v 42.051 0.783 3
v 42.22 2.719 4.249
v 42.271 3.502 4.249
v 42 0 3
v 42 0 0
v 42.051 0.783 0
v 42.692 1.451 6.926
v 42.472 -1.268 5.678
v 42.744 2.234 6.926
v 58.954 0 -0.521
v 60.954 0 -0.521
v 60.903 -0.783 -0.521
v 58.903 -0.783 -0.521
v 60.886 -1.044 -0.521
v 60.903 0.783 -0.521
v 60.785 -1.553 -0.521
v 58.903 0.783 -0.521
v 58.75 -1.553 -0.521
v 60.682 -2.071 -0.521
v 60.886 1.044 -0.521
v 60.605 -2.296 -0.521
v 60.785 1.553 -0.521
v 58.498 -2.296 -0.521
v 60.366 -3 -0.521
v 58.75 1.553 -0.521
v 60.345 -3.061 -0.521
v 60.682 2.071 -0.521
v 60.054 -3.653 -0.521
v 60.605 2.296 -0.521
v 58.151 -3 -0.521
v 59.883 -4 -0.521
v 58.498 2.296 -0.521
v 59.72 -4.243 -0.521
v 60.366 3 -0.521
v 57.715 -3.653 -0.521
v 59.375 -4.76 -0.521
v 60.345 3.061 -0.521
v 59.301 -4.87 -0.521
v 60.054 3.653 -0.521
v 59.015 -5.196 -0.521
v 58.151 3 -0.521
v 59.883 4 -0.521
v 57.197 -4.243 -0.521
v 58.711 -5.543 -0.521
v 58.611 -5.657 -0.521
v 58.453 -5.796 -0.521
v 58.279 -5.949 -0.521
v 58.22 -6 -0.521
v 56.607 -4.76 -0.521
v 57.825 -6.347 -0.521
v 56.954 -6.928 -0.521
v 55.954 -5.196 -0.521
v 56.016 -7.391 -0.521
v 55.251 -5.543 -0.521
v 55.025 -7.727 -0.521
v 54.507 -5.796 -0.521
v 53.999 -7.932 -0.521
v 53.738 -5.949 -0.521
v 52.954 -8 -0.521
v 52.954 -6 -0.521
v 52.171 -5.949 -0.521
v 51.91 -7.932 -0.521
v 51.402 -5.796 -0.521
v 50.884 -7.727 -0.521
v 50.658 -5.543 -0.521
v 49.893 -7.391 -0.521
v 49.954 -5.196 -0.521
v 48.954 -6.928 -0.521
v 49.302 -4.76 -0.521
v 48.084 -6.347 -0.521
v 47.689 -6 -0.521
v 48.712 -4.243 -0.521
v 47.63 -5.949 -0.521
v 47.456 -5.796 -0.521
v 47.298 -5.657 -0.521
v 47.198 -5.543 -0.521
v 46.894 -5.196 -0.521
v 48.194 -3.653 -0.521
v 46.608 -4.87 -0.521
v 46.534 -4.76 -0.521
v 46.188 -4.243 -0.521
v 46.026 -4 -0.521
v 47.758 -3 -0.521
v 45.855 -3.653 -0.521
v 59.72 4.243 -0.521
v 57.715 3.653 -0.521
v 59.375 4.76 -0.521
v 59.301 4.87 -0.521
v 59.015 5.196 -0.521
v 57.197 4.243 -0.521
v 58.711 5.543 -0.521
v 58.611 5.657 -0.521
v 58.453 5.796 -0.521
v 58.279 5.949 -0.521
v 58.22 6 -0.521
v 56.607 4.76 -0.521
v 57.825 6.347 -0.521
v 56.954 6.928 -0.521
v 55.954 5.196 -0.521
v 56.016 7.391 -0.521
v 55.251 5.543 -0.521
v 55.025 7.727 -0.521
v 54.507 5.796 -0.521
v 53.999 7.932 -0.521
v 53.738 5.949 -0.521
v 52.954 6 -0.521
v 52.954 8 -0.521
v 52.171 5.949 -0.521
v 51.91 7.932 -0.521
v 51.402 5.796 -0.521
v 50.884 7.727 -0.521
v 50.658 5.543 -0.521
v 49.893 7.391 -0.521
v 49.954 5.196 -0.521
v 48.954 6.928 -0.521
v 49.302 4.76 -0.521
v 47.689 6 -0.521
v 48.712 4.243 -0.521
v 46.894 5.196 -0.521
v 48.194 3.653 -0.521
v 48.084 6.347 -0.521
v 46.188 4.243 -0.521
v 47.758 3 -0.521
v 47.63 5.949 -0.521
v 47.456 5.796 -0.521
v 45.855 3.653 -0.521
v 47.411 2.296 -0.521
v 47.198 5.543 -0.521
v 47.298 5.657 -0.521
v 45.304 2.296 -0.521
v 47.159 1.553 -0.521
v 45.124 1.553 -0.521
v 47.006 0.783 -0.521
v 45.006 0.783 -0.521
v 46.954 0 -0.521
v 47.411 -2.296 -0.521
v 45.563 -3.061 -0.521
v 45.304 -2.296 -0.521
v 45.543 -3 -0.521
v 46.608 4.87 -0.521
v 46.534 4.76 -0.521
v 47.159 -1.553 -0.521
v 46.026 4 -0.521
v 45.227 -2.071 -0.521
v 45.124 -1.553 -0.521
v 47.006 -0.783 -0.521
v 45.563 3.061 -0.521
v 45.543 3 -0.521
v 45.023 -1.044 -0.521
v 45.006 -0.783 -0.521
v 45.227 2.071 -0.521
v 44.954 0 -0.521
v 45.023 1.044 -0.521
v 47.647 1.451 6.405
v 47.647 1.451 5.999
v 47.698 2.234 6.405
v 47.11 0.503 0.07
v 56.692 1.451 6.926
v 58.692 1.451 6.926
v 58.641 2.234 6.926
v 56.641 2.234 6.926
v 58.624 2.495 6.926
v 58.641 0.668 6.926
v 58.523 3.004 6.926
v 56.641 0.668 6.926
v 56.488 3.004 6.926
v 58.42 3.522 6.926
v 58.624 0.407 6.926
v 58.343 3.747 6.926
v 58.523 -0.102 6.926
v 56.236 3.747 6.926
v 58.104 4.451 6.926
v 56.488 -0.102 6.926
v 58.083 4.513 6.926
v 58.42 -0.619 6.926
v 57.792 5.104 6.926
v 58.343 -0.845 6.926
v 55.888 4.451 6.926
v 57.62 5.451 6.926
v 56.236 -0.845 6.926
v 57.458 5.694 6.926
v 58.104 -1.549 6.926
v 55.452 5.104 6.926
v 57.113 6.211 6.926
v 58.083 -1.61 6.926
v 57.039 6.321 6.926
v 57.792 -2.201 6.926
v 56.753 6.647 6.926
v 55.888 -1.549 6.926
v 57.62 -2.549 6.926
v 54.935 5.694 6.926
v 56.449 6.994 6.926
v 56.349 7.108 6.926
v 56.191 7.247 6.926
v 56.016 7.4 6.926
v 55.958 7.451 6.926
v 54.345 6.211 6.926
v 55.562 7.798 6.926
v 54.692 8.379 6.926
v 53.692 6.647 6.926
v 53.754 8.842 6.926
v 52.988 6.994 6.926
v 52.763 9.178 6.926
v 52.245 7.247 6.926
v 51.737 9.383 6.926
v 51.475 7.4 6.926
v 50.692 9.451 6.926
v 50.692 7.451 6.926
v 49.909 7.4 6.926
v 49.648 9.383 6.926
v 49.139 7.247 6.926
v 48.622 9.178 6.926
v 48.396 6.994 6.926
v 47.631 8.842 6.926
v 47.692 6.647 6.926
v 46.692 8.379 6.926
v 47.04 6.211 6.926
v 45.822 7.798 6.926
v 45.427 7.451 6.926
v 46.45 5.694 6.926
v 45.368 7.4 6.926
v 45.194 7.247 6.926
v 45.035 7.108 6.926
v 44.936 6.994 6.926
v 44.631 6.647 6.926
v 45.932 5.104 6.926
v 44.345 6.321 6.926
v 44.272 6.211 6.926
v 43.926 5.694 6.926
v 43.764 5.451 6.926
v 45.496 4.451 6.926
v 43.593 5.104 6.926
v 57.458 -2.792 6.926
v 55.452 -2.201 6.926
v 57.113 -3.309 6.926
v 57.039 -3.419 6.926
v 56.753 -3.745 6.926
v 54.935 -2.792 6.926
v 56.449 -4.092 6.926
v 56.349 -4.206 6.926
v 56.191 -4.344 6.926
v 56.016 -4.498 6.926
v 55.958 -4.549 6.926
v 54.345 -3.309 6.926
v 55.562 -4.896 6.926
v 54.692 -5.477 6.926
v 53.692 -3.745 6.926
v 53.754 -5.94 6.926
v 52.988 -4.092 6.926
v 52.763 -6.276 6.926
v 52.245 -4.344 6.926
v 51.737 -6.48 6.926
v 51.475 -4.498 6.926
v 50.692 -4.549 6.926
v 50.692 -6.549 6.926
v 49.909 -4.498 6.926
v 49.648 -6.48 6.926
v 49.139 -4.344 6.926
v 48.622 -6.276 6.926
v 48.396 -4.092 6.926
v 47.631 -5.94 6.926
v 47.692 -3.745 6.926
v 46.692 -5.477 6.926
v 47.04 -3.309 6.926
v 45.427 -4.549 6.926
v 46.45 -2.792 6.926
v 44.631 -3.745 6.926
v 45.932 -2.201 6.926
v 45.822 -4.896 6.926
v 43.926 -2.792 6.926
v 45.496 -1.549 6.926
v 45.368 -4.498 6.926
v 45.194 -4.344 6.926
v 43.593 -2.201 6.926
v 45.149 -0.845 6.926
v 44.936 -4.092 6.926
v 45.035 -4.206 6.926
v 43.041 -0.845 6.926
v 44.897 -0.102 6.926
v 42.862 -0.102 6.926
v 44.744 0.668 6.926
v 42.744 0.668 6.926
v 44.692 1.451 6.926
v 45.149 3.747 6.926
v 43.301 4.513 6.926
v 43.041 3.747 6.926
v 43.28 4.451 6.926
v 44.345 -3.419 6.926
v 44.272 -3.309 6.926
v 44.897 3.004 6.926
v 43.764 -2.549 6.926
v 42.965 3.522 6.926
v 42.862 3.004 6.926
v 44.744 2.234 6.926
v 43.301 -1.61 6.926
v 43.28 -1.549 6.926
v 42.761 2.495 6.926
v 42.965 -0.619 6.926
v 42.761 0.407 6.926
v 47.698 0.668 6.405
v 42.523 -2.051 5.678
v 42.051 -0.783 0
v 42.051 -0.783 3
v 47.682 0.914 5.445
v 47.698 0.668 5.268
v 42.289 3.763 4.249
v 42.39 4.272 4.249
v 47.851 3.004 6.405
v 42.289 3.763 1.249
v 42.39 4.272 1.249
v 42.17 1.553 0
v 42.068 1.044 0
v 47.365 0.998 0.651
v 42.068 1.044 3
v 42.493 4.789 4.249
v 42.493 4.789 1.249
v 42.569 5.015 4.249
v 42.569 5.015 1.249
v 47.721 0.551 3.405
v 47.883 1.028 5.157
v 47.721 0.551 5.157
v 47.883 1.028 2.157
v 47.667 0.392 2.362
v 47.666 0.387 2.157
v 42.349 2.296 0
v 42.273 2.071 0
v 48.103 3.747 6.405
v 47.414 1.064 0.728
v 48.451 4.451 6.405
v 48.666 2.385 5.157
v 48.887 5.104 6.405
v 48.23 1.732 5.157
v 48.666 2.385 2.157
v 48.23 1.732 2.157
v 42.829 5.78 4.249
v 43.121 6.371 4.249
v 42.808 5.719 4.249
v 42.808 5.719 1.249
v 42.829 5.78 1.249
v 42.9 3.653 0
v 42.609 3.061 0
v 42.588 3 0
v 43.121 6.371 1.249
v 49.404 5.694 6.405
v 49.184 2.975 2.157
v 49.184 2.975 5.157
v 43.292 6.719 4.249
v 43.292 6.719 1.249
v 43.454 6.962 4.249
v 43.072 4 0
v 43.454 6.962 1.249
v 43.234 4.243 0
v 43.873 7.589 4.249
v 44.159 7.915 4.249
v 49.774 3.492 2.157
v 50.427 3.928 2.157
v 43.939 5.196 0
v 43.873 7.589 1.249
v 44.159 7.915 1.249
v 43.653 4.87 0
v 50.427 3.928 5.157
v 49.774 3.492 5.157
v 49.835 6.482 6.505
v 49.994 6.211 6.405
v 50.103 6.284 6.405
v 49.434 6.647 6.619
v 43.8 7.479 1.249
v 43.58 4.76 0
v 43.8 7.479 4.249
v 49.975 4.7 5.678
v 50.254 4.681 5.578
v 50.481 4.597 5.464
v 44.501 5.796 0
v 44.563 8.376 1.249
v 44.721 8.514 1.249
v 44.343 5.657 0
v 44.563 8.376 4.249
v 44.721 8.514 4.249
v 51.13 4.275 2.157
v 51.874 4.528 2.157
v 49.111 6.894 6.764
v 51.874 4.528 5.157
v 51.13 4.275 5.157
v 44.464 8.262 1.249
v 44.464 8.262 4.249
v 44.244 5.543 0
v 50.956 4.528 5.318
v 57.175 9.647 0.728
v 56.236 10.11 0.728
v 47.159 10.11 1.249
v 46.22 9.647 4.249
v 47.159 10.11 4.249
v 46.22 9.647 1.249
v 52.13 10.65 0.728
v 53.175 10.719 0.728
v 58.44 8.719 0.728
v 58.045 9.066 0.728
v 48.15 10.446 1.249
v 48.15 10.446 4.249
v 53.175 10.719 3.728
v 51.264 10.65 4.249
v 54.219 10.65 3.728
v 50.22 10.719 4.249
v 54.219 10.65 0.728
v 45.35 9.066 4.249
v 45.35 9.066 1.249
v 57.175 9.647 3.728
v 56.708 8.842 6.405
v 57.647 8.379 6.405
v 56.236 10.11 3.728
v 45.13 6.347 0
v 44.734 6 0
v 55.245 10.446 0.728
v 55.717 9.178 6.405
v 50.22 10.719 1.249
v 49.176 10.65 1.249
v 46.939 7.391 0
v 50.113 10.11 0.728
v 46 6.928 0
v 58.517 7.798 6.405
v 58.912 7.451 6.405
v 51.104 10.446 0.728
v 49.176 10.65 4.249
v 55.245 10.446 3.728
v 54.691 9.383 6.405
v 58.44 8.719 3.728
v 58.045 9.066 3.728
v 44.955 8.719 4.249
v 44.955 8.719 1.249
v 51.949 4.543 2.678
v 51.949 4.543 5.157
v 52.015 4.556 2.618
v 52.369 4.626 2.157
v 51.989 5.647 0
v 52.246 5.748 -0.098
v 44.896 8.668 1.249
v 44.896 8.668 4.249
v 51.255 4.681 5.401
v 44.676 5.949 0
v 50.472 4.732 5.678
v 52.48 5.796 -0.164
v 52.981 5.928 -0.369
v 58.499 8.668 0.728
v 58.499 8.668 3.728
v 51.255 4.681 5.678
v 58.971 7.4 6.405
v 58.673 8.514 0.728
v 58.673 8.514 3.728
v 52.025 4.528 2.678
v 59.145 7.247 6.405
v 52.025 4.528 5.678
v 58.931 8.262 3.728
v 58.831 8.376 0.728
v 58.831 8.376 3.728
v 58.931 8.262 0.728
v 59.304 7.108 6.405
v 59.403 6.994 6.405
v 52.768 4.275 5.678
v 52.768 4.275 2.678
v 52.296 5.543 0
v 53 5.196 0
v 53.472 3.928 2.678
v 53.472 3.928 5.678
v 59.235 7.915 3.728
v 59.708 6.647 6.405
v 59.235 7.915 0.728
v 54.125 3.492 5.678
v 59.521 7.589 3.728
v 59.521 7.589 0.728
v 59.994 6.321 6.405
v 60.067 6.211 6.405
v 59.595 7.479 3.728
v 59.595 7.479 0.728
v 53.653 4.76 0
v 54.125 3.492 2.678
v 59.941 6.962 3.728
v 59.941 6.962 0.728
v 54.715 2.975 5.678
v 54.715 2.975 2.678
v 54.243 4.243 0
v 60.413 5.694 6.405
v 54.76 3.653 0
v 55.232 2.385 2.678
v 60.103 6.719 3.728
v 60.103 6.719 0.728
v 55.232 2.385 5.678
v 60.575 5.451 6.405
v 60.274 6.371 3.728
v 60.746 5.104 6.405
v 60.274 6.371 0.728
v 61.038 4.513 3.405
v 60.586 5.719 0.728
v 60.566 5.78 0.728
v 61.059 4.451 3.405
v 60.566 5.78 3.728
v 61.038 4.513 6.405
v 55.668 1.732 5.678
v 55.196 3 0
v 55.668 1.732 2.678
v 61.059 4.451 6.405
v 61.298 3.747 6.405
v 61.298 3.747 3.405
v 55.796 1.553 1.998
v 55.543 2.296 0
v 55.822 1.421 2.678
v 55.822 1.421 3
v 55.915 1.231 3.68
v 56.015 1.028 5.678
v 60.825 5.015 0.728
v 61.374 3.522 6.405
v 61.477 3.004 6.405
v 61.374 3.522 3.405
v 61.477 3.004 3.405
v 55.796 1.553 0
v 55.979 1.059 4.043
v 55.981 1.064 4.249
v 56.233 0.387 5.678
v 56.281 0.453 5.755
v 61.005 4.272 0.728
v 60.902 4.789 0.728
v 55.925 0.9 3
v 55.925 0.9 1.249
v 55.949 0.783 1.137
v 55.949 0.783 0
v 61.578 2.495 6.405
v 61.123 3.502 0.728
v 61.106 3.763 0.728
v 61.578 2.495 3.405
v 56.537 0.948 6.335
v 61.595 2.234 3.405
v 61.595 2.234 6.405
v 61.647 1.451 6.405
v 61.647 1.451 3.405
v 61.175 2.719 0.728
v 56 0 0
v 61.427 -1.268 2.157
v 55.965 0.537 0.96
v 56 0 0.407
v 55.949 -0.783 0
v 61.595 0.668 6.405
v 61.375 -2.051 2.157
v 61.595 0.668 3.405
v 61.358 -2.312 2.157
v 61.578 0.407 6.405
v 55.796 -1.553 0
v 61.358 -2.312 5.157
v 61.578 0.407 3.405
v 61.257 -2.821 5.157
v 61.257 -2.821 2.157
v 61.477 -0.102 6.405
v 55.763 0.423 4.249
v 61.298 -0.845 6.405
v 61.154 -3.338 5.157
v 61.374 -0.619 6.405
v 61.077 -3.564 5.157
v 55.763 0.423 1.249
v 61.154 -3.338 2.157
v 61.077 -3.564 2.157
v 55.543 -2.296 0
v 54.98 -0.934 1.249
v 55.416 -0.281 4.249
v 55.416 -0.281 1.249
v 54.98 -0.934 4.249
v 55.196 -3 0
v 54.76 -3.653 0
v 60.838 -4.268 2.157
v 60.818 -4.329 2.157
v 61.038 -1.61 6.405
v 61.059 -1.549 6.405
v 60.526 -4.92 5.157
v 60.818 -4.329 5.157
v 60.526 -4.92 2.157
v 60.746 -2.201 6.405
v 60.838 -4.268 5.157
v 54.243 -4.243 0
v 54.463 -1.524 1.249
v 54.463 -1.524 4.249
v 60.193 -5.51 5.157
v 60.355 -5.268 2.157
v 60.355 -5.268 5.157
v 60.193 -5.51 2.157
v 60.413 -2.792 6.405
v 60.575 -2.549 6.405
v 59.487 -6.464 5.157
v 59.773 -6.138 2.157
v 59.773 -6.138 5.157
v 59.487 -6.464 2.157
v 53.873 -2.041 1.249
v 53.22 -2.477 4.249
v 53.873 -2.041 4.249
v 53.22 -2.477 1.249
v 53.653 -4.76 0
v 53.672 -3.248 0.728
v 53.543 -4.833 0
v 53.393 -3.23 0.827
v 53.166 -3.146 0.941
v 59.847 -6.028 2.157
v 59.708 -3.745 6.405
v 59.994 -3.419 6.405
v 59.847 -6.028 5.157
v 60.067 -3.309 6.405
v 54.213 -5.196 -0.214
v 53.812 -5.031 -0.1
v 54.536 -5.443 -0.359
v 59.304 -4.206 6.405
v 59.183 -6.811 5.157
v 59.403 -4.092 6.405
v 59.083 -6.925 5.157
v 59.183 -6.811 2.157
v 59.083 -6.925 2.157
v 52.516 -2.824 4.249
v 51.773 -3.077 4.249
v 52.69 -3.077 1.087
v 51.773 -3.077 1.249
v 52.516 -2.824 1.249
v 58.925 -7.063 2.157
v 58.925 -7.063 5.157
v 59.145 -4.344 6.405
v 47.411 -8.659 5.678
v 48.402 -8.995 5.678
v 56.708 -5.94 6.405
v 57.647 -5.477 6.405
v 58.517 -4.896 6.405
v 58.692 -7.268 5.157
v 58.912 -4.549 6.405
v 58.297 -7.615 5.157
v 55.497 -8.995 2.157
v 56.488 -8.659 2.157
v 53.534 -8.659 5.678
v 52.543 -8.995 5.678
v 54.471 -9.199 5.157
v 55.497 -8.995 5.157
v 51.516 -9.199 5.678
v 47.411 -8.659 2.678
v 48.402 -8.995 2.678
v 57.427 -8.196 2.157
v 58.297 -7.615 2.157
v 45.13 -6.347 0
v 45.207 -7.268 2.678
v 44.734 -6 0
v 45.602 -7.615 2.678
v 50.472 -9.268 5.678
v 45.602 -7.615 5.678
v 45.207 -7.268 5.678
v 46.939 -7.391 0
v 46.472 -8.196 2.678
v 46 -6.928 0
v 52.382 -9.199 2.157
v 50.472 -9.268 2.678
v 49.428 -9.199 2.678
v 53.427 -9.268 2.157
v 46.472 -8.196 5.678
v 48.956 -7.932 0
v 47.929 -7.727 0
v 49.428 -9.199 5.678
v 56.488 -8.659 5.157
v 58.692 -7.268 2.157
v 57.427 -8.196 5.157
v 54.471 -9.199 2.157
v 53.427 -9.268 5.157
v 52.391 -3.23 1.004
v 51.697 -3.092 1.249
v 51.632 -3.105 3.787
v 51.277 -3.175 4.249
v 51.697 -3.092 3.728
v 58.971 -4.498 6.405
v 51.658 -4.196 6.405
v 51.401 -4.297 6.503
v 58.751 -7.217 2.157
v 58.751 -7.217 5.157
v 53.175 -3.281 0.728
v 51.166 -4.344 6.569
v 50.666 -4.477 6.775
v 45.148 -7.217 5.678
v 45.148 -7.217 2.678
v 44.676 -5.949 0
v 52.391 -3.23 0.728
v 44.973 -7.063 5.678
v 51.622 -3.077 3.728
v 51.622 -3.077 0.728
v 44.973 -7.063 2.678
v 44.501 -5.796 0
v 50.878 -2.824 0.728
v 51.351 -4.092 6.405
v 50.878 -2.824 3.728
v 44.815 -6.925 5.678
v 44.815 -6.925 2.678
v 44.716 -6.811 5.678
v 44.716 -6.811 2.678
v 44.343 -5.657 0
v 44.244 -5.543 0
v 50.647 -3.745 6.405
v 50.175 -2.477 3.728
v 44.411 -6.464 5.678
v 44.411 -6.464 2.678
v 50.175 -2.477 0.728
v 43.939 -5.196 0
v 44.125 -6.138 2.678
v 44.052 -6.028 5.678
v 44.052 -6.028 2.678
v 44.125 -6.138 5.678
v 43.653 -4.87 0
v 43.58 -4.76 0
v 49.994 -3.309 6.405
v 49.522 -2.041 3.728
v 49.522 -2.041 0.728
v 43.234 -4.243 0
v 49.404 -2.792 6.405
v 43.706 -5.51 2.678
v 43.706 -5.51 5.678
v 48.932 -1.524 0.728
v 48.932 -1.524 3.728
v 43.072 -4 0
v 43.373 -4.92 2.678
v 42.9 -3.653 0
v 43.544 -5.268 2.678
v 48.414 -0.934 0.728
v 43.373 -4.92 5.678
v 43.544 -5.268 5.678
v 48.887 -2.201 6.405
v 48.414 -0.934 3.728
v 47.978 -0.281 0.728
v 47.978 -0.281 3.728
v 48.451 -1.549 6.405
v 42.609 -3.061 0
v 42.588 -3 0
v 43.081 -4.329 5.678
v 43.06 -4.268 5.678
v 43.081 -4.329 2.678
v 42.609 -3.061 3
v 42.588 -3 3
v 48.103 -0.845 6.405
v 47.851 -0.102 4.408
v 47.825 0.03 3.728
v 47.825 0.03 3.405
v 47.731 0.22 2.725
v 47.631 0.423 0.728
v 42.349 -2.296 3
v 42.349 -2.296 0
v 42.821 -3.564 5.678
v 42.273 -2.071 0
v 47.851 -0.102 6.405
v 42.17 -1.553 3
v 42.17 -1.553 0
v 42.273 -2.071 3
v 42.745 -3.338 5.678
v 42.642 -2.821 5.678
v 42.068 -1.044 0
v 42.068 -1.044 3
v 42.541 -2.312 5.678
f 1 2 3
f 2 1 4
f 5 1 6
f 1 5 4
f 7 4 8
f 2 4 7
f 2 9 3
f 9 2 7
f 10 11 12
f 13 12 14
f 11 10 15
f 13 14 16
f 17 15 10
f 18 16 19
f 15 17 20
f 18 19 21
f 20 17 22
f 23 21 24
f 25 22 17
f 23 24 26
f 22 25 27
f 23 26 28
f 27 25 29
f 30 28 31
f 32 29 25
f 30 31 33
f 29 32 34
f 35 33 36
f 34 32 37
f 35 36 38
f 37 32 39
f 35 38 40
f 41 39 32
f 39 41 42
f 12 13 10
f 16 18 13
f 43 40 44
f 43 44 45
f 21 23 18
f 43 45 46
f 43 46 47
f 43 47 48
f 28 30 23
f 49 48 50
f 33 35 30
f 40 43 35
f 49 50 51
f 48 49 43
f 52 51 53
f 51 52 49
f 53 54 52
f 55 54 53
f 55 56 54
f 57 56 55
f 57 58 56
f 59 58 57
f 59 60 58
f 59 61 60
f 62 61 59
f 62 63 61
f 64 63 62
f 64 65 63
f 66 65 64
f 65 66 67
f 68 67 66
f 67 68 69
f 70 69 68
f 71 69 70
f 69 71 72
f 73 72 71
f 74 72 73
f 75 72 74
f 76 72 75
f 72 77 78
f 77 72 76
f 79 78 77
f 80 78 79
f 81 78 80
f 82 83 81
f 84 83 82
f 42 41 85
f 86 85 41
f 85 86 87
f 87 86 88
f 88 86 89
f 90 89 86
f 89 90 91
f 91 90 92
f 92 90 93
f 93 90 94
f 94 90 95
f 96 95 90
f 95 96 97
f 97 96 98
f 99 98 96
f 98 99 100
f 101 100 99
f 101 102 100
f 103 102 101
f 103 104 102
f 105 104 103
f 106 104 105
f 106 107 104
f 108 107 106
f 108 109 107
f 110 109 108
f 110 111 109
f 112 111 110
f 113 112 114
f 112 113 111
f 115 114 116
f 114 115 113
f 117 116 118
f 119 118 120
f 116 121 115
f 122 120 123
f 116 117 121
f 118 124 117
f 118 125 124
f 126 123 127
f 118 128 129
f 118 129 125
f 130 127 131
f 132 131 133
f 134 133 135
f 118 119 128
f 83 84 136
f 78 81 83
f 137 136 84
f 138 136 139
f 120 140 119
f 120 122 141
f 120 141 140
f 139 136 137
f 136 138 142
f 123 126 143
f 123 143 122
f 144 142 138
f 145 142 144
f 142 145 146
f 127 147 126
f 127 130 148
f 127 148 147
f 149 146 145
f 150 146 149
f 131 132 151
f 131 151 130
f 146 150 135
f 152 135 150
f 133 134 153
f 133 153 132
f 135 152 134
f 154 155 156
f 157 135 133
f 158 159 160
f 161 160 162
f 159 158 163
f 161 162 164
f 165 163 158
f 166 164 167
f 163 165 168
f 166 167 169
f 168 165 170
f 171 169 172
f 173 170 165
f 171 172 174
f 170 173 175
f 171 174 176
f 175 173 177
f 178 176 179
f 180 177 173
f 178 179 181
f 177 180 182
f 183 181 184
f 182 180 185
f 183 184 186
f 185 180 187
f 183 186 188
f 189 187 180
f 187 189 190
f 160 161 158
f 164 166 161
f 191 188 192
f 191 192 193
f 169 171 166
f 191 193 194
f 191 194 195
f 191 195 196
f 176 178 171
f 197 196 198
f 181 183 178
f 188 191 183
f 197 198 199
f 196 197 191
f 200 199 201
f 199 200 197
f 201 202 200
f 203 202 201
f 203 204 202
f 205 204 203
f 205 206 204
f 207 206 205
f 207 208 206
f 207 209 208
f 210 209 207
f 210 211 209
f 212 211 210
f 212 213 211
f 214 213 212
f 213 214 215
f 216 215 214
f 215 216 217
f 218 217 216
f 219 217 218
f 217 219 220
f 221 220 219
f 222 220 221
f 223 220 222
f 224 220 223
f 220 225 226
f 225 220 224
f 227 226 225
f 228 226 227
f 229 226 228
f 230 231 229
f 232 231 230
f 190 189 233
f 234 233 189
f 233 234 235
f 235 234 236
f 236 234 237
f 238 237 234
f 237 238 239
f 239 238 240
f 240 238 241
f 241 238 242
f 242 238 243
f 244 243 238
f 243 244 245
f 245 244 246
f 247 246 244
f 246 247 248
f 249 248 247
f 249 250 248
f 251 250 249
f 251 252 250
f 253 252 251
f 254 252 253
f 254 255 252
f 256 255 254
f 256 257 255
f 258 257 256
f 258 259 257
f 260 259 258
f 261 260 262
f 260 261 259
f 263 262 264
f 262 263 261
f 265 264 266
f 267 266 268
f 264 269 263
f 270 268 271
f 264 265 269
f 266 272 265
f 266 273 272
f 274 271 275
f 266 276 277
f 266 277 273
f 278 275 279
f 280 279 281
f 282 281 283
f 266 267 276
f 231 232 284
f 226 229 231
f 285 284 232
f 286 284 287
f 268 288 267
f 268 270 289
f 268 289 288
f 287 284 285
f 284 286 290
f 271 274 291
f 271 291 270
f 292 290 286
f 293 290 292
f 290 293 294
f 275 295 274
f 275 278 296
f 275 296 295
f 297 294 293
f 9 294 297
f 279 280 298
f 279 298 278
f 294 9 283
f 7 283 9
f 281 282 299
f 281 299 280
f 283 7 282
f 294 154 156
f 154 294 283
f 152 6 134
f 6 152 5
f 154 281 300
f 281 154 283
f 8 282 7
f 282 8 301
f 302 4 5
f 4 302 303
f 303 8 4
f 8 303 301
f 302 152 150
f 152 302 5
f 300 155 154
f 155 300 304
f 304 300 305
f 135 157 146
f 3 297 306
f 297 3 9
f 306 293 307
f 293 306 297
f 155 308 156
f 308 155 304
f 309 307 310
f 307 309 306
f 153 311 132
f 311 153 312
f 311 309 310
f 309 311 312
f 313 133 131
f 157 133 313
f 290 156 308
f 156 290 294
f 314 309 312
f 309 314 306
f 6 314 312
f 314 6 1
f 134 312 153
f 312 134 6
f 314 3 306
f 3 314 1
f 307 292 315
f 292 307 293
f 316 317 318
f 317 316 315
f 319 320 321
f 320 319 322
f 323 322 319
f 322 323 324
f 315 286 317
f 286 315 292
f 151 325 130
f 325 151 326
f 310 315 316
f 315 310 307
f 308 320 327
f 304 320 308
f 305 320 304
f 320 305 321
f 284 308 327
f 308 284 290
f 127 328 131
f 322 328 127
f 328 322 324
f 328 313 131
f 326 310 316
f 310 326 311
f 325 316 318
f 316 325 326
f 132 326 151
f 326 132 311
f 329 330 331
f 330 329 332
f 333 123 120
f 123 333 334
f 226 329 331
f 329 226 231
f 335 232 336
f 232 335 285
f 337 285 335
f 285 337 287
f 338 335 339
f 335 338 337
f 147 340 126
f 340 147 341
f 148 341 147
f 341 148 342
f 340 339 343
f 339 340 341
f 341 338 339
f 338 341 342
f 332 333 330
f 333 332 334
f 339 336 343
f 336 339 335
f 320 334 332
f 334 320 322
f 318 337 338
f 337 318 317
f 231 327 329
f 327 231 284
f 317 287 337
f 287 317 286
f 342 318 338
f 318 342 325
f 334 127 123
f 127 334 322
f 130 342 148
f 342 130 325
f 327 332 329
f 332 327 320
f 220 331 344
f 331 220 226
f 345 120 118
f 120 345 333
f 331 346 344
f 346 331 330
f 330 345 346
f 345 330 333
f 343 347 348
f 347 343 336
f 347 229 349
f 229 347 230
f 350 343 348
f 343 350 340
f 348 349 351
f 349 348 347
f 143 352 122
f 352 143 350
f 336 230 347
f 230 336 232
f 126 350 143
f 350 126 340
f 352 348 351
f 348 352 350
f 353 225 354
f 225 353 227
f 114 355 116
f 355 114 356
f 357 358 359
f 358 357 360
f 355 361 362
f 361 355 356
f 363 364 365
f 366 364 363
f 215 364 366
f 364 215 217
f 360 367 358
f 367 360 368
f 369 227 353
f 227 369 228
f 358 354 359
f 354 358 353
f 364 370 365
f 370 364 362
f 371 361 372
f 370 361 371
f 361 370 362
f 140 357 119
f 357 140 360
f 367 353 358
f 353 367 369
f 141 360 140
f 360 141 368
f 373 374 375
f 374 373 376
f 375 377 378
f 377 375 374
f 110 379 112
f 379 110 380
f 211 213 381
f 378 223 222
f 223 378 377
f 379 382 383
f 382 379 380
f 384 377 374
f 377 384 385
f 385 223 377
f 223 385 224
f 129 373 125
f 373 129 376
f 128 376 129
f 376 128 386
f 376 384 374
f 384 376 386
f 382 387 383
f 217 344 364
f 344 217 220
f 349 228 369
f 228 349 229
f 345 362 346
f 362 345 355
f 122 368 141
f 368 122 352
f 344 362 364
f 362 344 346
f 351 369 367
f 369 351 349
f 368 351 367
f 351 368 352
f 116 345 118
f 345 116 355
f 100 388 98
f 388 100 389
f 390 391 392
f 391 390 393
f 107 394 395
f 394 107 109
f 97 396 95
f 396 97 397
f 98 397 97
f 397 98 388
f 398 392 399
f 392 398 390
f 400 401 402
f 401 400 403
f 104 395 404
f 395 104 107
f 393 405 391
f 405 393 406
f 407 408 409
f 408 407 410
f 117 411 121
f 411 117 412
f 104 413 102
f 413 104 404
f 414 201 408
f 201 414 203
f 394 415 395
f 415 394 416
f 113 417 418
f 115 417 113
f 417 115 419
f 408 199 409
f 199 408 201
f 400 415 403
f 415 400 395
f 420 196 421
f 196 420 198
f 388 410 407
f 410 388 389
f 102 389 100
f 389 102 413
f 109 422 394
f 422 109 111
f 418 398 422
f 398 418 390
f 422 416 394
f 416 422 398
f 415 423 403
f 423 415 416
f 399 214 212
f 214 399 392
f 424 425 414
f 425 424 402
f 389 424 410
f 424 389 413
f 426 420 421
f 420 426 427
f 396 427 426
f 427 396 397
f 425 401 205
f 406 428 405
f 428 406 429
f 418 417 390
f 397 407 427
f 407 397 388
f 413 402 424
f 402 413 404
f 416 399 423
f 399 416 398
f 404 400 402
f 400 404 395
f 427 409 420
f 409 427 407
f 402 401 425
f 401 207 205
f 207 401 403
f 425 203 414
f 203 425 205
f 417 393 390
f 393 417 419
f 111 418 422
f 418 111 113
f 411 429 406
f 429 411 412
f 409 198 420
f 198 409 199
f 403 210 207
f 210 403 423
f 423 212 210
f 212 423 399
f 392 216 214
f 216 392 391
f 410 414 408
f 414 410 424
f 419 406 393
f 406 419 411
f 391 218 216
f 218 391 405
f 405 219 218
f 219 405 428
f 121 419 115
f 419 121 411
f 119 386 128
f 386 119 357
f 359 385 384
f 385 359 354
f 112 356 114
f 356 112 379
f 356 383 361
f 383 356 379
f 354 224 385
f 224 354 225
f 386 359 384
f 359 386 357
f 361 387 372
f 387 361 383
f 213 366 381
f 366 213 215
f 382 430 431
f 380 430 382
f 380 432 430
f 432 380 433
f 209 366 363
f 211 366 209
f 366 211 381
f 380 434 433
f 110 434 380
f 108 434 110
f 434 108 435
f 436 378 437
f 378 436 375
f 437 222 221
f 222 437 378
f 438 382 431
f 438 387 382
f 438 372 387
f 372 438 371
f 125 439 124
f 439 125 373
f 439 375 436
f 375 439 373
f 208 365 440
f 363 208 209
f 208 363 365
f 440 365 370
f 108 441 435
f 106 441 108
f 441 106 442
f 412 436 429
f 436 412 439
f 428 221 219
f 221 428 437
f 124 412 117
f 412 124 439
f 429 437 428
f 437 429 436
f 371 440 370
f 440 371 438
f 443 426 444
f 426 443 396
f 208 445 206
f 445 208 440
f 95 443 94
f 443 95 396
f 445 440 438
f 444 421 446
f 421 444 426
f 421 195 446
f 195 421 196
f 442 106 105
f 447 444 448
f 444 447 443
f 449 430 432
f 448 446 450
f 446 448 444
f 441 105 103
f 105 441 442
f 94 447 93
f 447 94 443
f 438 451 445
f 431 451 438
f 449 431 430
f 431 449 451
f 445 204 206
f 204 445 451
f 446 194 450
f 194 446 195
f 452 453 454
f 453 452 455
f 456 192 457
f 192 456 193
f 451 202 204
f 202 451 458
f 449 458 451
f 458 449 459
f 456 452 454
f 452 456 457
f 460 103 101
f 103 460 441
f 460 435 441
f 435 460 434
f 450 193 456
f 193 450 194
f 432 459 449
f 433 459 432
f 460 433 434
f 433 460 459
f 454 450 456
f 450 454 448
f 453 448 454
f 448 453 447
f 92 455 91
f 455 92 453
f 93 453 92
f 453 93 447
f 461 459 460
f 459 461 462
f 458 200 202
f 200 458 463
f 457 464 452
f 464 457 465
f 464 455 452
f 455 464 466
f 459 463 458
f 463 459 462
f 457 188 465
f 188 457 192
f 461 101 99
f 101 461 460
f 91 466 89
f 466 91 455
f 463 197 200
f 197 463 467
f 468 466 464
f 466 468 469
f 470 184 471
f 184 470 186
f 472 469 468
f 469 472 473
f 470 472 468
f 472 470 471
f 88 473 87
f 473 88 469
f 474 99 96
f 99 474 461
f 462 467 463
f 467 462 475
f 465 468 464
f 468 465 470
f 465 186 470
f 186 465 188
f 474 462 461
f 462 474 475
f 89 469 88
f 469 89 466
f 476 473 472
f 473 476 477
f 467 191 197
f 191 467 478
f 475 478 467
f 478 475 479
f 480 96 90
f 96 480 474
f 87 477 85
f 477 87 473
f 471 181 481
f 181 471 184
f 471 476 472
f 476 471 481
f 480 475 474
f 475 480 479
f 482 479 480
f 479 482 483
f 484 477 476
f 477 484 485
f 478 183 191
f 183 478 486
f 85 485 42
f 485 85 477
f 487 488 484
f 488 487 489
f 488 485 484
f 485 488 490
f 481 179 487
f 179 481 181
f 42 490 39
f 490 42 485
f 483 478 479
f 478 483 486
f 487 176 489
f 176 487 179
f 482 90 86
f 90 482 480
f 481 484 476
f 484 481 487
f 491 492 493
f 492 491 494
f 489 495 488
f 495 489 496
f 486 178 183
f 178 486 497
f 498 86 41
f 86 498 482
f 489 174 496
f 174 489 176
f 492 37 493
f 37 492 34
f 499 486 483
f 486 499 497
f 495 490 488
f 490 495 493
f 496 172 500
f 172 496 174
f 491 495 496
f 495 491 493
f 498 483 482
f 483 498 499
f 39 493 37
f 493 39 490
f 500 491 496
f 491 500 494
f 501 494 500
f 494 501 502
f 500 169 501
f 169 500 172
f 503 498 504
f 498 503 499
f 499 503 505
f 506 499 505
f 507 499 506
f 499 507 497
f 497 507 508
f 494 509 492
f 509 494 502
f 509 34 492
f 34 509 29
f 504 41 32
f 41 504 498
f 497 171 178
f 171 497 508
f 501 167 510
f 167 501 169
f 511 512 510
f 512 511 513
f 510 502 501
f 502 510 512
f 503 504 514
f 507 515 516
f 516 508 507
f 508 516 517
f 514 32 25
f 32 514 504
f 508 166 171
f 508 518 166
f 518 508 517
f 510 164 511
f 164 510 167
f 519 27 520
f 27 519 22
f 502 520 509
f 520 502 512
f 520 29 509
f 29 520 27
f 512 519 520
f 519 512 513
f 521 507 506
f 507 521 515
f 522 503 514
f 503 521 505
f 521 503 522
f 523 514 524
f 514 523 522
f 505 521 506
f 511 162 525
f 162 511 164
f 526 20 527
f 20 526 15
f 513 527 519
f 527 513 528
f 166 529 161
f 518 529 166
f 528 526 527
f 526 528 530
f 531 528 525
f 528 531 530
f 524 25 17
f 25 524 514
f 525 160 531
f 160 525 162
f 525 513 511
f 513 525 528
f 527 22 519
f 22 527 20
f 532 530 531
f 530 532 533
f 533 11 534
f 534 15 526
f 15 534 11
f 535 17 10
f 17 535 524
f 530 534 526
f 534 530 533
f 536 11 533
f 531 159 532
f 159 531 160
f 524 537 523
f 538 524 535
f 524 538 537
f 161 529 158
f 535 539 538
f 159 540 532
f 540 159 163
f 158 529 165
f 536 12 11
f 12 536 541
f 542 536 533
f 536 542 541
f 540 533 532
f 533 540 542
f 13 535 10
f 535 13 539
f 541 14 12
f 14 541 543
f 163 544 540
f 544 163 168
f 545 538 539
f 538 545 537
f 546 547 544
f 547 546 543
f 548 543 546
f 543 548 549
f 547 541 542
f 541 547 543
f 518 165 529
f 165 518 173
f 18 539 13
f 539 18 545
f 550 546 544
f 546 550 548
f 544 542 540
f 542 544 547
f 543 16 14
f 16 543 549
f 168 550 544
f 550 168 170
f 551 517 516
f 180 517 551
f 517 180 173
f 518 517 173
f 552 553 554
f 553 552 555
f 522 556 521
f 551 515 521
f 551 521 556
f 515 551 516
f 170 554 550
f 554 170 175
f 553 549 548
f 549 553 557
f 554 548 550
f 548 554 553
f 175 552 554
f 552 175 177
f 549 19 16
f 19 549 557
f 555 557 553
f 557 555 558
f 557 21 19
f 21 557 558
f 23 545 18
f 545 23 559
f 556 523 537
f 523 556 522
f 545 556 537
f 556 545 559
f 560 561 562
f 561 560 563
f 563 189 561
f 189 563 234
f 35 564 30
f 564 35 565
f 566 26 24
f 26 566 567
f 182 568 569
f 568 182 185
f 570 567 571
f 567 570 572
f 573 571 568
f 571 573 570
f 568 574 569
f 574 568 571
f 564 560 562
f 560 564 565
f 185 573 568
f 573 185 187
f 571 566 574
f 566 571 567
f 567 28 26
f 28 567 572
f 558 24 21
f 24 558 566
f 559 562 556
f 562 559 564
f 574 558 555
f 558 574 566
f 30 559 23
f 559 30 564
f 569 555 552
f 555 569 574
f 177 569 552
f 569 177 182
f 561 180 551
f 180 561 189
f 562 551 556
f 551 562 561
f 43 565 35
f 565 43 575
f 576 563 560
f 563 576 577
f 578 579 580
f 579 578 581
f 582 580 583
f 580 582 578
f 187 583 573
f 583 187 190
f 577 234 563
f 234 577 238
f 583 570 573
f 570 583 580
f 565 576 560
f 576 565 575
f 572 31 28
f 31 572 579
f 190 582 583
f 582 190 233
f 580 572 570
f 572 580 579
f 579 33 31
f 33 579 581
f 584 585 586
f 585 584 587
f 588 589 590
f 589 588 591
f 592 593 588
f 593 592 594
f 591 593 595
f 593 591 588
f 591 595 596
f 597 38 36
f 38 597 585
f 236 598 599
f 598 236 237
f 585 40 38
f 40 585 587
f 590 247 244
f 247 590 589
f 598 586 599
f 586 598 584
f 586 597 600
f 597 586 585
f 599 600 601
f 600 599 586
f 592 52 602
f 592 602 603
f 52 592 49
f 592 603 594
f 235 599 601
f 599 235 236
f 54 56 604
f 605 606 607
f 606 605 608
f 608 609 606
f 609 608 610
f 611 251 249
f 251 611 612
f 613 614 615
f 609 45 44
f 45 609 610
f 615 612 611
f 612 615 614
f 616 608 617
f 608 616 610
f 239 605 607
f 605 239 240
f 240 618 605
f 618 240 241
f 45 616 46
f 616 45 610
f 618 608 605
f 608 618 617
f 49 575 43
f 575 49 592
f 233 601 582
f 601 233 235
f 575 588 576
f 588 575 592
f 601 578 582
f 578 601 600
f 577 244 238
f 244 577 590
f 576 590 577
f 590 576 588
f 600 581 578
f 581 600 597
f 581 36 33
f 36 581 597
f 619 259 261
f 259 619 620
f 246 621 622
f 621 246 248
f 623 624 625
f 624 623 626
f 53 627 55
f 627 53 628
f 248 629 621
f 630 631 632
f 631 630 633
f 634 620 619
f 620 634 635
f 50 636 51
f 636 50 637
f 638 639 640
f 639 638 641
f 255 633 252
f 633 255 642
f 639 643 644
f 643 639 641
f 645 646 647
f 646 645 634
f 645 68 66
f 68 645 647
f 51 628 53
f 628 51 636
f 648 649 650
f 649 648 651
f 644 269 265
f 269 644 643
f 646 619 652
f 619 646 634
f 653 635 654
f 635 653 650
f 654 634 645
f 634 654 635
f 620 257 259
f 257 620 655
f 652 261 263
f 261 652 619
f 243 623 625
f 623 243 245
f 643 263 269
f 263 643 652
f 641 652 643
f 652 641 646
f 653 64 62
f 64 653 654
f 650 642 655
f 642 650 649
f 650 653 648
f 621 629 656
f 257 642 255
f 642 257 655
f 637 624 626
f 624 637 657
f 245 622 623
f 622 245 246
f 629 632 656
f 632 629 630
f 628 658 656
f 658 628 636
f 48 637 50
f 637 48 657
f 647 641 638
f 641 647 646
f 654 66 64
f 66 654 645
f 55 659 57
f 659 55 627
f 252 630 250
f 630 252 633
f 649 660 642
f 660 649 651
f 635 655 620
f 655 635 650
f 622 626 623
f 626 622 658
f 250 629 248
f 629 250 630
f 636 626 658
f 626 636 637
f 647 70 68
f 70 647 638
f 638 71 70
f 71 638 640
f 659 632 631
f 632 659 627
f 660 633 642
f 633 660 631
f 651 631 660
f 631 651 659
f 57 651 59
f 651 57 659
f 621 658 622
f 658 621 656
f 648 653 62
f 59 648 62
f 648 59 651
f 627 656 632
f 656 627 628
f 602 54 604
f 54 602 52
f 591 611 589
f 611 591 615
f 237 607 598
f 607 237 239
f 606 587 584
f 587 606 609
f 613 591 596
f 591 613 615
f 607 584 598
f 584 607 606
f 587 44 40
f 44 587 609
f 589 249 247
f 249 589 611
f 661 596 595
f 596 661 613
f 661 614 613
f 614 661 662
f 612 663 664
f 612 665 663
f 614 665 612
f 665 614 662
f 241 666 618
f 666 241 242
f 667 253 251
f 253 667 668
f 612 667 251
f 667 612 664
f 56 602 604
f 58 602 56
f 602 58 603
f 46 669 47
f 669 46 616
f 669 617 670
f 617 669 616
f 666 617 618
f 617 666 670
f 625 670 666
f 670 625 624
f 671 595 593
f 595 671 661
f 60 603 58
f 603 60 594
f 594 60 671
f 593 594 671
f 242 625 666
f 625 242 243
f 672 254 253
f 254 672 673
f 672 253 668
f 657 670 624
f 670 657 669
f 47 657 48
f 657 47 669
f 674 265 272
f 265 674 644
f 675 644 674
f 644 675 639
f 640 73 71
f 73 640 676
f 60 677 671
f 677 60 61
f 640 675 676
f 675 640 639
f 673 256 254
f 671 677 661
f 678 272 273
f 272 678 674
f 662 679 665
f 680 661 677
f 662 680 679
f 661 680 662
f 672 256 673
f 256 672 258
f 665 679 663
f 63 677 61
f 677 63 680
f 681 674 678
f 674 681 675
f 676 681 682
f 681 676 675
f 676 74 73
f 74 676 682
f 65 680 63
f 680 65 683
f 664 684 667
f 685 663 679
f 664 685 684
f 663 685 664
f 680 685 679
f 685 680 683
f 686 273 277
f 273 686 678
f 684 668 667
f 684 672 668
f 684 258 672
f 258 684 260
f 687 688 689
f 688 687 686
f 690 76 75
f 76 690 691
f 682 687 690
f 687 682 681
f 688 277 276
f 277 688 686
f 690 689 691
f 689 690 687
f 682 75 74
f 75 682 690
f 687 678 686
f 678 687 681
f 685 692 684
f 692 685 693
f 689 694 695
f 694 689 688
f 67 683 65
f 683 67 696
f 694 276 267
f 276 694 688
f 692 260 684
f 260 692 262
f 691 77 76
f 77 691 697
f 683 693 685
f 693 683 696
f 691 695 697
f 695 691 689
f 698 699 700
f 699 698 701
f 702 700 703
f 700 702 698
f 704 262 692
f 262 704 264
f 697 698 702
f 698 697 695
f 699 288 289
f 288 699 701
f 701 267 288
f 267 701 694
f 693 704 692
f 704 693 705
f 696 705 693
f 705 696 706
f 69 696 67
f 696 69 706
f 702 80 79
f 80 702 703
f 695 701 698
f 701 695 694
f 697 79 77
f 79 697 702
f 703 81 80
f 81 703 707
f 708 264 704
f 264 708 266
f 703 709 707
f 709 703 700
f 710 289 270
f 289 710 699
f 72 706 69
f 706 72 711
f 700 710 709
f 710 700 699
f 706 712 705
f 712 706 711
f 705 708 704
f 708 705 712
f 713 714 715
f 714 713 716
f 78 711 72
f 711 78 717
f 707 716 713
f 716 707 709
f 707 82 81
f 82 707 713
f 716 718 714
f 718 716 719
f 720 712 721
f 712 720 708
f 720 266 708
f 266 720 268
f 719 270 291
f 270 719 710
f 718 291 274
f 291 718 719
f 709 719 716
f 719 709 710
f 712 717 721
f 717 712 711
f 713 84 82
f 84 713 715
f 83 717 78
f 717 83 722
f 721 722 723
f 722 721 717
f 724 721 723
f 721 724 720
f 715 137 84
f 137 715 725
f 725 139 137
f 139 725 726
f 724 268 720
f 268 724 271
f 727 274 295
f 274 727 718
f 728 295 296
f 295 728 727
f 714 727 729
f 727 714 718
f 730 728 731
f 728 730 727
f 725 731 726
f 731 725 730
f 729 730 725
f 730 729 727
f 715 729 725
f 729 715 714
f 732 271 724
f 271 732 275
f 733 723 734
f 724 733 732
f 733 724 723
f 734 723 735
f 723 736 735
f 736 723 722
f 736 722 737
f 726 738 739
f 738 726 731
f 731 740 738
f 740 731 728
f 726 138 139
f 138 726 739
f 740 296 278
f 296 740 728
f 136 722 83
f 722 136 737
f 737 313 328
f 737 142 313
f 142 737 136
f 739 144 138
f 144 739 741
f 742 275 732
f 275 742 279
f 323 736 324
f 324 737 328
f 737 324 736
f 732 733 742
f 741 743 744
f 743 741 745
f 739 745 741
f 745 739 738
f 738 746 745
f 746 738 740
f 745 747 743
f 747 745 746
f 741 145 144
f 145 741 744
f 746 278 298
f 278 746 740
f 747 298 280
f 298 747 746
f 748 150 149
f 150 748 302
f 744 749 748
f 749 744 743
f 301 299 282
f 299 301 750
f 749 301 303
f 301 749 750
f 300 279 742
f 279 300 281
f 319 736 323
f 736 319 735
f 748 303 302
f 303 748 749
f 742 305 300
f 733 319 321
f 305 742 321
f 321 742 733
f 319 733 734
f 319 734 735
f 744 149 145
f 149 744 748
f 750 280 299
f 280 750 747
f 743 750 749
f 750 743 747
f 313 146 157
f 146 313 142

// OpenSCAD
// A kernel nowhere near the origin, on the mesh route (a ring and a tipped cube share no exact
// construction): the sum moves with the kernel. manifold's own sum kept the untranslated ring in the
// result. ($fn keeps OpenSCAD's own decomposition of the ring quick.)
minkowski() {
  rotate_extrude($fn = 48) translate([6, 0]) square([2, 3]);
  translate([50, 0, 0]) rotate([25, 10, 0]) cube(3);
}
